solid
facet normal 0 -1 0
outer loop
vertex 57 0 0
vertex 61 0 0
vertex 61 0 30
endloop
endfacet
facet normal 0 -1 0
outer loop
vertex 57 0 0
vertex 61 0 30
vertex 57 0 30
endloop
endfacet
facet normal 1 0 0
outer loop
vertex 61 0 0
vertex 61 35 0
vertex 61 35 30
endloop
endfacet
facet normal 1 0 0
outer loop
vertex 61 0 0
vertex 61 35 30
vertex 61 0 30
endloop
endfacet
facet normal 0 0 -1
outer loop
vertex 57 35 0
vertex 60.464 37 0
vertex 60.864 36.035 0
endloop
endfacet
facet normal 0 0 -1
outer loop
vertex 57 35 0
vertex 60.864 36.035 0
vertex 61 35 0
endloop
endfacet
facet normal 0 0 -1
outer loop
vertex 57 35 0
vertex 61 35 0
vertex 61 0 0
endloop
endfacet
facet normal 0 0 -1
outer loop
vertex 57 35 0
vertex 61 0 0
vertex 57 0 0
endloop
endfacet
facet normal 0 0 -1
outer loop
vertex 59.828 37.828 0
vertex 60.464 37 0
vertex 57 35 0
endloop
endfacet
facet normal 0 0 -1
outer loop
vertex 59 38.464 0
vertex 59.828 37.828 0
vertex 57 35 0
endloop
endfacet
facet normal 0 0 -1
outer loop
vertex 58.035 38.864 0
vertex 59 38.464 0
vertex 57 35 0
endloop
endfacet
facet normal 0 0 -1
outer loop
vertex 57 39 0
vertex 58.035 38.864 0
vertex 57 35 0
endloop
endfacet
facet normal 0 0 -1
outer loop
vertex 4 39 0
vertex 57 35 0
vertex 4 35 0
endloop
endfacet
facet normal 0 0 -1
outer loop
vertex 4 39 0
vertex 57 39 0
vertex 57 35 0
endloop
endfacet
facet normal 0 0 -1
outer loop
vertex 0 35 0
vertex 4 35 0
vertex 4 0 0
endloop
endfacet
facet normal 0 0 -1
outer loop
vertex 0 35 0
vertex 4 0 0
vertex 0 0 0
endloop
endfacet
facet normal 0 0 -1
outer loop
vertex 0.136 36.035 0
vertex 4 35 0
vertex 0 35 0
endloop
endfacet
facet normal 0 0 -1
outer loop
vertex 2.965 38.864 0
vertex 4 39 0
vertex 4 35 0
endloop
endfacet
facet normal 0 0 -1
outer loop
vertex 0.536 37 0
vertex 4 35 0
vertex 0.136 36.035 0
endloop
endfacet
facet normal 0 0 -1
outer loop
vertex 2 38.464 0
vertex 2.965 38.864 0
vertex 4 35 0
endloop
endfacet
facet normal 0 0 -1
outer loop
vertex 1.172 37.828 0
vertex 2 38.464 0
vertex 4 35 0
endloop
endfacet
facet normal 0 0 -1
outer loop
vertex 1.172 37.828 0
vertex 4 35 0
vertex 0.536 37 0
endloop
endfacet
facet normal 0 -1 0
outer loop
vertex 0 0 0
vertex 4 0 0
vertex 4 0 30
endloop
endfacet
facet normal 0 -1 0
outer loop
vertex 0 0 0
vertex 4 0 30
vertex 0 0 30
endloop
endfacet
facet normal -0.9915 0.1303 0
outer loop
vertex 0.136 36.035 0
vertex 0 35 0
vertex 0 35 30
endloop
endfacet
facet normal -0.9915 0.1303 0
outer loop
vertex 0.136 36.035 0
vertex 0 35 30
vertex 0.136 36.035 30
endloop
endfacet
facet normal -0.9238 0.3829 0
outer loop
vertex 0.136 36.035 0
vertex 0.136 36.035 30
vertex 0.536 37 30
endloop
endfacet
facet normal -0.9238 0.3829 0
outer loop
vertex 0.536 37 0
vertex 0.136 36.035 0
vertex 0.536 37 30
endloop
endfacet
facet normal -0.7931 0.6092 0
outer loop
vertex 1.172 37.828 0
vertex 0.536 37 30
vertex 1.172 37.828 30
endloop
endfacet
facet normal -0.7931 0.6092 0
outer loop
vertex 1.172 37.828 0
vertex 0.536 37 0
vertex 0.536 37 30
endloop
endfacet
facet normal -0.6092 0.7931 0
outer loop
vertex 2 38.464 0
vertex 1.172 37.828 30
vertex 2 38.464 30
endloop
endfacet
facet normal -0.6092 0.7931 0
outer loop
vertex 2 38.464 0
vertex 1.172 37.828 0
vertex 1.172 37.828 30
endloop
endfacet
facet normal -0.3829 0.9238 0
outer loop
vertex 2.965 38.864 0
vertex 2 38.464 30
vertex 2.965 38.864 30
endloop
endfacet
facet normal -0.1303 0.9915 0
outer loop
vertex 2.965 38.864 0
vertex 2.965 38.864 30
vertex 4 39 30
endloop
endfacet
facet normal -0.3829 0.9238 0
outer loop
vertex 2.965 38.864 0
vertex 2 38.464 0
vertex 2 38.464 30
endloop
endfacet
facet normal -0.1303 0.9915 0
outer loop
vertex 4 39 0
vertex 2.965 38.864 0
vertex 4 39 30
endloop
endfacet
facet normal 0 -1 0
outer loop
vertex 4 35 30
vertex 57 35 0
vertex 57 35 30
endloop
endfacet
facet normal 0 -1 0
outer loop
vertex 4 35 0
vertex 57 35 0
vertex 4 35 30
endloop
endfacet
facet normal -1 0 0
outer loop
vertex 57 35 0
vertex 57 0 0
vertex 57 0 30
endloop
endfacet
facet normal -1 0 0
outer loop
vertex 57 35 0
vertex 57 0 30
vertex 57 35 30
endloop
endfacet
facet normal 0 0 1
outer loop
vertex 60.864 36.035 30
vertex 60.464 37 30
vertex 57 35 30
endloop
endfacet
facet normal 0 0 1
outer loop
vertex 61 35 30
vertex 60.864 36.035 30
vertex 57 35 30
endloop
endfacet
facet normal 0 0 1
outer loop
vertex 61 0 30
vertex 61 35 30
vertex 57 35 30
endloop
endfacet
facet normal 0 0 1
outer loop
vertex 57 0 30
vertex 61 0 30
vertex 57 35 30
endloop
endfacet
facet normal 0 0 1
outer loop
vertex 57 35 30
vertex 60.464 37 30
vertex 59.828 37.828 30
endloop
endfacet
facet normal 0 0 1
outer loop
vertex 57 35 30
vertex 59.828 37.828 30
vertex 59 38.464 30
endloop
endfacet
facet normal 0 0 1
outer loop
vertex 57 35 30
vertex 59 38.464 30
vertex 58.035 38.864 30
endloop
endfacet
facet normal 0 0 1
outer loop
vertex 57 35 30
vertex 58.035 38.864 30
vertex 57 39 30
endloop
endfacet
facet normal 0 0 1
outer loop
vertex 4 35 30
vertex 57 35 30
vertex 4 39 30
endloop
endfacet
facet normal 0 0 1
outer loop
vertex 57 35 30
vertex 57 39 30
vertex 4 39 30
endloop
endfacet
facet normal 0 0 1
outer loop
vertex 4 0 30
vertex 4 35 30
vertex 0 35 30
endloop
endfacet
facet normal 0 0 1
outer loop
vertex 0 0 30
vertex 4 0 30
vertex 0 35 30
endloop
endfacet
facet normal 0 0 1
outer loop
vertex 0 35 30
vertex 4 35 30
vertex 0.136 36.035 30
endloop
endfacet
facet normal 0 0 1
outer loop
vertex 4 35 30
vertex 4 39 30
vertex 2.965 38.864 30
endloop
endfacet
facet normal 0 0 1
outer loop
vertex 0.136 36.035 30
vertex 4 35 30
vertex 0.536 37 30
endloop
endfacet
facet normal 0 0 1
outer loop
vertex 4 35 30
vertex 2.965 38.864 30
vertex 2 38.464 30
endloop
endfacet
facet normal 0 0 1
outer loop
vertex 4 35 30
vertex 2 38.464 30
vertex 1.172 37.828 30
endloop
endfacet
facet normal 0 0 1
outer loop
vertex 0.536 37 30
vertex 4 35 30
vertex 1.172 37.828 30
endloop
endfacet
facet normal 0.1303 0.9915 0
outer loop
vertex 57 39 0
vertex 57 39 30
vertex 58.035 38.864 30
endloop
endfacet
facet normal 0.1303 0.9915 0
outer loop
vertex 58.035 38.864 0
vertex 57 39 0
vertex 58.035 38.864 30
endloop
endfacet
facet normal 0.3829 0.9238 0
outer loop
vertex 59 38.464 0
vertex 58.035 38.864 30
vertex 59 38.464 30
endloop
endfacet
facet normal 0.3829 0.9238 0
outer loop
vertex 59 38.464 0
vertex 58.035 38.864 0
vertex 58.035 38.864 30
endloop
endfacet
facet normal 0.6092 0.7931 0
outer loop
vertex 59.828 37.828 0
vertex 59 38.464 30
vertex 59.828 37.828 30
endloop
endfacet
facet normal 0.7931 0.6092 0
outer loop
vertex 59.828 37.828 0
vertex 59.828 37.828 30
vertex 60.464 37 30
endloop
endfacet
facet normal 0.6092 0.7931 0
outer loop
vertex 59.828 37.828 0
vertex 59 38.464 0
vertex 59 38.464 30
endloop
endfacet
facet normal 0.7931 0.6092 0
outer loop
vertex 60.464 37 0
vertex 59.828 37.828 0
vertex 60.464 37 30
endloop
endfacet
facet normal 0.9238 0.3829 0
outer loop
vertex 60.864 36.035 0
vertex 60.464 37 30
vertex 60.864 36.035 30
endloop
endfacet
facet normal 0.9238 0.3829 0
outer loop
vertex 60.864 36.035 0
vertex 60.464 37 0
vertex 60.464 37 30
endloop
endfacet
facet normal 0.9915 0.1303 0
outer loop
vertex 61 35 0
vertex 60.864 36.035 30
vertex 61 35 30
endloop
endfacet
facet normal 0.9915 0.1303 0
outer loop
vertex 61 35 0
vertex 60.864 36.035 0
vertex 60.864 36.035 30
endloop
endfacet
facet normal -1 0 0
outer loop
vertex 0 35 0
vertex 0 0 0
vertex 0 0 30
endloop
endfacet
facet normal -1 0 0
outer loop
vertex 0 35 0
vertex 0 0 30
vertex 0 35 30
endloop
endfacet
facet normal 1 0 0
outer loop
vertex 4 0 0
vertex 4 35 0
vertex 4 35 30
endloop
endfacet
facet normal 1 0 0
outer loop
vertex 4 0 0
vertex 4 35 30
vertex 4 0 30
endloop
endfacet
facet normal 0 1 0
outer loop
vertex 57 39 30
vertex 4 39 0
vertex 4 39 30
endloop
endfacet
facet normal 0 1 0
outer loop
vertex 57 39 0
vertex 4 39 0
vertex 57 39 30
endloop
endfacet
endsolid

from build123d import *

# Parameters (mm, degrees)
BOSS_EXTRUDE1_DEPTH = 30


with BuildPart() as part:
    # Sketch1 → Boss-Extrude1 (new body)
    with BuildSketch(Plane.XY):
        with BuildLine():
            Line((0, 0), (0, 35))
            ThreePointArc((0, 35), (1.171572875, 37.828427125), (4, 39))
            Line((4, 39), (57, 39))
            ThreePointArc((57, 39), (59.828427125, 37.828427125), (61, 35))
            Line((61, 35), (61, 0))
            Line((61, 0), (57, 0))
            Line((57, 0), (57, 35))
            Line((57, 35), (4, 35))
            Line((4, 35), (4, 0))
            Line((4, 0), (0, 0))
        make_face()
    extrude(amount=BOSS_EXTRUDE1_DEPTH)


solid = part.part
